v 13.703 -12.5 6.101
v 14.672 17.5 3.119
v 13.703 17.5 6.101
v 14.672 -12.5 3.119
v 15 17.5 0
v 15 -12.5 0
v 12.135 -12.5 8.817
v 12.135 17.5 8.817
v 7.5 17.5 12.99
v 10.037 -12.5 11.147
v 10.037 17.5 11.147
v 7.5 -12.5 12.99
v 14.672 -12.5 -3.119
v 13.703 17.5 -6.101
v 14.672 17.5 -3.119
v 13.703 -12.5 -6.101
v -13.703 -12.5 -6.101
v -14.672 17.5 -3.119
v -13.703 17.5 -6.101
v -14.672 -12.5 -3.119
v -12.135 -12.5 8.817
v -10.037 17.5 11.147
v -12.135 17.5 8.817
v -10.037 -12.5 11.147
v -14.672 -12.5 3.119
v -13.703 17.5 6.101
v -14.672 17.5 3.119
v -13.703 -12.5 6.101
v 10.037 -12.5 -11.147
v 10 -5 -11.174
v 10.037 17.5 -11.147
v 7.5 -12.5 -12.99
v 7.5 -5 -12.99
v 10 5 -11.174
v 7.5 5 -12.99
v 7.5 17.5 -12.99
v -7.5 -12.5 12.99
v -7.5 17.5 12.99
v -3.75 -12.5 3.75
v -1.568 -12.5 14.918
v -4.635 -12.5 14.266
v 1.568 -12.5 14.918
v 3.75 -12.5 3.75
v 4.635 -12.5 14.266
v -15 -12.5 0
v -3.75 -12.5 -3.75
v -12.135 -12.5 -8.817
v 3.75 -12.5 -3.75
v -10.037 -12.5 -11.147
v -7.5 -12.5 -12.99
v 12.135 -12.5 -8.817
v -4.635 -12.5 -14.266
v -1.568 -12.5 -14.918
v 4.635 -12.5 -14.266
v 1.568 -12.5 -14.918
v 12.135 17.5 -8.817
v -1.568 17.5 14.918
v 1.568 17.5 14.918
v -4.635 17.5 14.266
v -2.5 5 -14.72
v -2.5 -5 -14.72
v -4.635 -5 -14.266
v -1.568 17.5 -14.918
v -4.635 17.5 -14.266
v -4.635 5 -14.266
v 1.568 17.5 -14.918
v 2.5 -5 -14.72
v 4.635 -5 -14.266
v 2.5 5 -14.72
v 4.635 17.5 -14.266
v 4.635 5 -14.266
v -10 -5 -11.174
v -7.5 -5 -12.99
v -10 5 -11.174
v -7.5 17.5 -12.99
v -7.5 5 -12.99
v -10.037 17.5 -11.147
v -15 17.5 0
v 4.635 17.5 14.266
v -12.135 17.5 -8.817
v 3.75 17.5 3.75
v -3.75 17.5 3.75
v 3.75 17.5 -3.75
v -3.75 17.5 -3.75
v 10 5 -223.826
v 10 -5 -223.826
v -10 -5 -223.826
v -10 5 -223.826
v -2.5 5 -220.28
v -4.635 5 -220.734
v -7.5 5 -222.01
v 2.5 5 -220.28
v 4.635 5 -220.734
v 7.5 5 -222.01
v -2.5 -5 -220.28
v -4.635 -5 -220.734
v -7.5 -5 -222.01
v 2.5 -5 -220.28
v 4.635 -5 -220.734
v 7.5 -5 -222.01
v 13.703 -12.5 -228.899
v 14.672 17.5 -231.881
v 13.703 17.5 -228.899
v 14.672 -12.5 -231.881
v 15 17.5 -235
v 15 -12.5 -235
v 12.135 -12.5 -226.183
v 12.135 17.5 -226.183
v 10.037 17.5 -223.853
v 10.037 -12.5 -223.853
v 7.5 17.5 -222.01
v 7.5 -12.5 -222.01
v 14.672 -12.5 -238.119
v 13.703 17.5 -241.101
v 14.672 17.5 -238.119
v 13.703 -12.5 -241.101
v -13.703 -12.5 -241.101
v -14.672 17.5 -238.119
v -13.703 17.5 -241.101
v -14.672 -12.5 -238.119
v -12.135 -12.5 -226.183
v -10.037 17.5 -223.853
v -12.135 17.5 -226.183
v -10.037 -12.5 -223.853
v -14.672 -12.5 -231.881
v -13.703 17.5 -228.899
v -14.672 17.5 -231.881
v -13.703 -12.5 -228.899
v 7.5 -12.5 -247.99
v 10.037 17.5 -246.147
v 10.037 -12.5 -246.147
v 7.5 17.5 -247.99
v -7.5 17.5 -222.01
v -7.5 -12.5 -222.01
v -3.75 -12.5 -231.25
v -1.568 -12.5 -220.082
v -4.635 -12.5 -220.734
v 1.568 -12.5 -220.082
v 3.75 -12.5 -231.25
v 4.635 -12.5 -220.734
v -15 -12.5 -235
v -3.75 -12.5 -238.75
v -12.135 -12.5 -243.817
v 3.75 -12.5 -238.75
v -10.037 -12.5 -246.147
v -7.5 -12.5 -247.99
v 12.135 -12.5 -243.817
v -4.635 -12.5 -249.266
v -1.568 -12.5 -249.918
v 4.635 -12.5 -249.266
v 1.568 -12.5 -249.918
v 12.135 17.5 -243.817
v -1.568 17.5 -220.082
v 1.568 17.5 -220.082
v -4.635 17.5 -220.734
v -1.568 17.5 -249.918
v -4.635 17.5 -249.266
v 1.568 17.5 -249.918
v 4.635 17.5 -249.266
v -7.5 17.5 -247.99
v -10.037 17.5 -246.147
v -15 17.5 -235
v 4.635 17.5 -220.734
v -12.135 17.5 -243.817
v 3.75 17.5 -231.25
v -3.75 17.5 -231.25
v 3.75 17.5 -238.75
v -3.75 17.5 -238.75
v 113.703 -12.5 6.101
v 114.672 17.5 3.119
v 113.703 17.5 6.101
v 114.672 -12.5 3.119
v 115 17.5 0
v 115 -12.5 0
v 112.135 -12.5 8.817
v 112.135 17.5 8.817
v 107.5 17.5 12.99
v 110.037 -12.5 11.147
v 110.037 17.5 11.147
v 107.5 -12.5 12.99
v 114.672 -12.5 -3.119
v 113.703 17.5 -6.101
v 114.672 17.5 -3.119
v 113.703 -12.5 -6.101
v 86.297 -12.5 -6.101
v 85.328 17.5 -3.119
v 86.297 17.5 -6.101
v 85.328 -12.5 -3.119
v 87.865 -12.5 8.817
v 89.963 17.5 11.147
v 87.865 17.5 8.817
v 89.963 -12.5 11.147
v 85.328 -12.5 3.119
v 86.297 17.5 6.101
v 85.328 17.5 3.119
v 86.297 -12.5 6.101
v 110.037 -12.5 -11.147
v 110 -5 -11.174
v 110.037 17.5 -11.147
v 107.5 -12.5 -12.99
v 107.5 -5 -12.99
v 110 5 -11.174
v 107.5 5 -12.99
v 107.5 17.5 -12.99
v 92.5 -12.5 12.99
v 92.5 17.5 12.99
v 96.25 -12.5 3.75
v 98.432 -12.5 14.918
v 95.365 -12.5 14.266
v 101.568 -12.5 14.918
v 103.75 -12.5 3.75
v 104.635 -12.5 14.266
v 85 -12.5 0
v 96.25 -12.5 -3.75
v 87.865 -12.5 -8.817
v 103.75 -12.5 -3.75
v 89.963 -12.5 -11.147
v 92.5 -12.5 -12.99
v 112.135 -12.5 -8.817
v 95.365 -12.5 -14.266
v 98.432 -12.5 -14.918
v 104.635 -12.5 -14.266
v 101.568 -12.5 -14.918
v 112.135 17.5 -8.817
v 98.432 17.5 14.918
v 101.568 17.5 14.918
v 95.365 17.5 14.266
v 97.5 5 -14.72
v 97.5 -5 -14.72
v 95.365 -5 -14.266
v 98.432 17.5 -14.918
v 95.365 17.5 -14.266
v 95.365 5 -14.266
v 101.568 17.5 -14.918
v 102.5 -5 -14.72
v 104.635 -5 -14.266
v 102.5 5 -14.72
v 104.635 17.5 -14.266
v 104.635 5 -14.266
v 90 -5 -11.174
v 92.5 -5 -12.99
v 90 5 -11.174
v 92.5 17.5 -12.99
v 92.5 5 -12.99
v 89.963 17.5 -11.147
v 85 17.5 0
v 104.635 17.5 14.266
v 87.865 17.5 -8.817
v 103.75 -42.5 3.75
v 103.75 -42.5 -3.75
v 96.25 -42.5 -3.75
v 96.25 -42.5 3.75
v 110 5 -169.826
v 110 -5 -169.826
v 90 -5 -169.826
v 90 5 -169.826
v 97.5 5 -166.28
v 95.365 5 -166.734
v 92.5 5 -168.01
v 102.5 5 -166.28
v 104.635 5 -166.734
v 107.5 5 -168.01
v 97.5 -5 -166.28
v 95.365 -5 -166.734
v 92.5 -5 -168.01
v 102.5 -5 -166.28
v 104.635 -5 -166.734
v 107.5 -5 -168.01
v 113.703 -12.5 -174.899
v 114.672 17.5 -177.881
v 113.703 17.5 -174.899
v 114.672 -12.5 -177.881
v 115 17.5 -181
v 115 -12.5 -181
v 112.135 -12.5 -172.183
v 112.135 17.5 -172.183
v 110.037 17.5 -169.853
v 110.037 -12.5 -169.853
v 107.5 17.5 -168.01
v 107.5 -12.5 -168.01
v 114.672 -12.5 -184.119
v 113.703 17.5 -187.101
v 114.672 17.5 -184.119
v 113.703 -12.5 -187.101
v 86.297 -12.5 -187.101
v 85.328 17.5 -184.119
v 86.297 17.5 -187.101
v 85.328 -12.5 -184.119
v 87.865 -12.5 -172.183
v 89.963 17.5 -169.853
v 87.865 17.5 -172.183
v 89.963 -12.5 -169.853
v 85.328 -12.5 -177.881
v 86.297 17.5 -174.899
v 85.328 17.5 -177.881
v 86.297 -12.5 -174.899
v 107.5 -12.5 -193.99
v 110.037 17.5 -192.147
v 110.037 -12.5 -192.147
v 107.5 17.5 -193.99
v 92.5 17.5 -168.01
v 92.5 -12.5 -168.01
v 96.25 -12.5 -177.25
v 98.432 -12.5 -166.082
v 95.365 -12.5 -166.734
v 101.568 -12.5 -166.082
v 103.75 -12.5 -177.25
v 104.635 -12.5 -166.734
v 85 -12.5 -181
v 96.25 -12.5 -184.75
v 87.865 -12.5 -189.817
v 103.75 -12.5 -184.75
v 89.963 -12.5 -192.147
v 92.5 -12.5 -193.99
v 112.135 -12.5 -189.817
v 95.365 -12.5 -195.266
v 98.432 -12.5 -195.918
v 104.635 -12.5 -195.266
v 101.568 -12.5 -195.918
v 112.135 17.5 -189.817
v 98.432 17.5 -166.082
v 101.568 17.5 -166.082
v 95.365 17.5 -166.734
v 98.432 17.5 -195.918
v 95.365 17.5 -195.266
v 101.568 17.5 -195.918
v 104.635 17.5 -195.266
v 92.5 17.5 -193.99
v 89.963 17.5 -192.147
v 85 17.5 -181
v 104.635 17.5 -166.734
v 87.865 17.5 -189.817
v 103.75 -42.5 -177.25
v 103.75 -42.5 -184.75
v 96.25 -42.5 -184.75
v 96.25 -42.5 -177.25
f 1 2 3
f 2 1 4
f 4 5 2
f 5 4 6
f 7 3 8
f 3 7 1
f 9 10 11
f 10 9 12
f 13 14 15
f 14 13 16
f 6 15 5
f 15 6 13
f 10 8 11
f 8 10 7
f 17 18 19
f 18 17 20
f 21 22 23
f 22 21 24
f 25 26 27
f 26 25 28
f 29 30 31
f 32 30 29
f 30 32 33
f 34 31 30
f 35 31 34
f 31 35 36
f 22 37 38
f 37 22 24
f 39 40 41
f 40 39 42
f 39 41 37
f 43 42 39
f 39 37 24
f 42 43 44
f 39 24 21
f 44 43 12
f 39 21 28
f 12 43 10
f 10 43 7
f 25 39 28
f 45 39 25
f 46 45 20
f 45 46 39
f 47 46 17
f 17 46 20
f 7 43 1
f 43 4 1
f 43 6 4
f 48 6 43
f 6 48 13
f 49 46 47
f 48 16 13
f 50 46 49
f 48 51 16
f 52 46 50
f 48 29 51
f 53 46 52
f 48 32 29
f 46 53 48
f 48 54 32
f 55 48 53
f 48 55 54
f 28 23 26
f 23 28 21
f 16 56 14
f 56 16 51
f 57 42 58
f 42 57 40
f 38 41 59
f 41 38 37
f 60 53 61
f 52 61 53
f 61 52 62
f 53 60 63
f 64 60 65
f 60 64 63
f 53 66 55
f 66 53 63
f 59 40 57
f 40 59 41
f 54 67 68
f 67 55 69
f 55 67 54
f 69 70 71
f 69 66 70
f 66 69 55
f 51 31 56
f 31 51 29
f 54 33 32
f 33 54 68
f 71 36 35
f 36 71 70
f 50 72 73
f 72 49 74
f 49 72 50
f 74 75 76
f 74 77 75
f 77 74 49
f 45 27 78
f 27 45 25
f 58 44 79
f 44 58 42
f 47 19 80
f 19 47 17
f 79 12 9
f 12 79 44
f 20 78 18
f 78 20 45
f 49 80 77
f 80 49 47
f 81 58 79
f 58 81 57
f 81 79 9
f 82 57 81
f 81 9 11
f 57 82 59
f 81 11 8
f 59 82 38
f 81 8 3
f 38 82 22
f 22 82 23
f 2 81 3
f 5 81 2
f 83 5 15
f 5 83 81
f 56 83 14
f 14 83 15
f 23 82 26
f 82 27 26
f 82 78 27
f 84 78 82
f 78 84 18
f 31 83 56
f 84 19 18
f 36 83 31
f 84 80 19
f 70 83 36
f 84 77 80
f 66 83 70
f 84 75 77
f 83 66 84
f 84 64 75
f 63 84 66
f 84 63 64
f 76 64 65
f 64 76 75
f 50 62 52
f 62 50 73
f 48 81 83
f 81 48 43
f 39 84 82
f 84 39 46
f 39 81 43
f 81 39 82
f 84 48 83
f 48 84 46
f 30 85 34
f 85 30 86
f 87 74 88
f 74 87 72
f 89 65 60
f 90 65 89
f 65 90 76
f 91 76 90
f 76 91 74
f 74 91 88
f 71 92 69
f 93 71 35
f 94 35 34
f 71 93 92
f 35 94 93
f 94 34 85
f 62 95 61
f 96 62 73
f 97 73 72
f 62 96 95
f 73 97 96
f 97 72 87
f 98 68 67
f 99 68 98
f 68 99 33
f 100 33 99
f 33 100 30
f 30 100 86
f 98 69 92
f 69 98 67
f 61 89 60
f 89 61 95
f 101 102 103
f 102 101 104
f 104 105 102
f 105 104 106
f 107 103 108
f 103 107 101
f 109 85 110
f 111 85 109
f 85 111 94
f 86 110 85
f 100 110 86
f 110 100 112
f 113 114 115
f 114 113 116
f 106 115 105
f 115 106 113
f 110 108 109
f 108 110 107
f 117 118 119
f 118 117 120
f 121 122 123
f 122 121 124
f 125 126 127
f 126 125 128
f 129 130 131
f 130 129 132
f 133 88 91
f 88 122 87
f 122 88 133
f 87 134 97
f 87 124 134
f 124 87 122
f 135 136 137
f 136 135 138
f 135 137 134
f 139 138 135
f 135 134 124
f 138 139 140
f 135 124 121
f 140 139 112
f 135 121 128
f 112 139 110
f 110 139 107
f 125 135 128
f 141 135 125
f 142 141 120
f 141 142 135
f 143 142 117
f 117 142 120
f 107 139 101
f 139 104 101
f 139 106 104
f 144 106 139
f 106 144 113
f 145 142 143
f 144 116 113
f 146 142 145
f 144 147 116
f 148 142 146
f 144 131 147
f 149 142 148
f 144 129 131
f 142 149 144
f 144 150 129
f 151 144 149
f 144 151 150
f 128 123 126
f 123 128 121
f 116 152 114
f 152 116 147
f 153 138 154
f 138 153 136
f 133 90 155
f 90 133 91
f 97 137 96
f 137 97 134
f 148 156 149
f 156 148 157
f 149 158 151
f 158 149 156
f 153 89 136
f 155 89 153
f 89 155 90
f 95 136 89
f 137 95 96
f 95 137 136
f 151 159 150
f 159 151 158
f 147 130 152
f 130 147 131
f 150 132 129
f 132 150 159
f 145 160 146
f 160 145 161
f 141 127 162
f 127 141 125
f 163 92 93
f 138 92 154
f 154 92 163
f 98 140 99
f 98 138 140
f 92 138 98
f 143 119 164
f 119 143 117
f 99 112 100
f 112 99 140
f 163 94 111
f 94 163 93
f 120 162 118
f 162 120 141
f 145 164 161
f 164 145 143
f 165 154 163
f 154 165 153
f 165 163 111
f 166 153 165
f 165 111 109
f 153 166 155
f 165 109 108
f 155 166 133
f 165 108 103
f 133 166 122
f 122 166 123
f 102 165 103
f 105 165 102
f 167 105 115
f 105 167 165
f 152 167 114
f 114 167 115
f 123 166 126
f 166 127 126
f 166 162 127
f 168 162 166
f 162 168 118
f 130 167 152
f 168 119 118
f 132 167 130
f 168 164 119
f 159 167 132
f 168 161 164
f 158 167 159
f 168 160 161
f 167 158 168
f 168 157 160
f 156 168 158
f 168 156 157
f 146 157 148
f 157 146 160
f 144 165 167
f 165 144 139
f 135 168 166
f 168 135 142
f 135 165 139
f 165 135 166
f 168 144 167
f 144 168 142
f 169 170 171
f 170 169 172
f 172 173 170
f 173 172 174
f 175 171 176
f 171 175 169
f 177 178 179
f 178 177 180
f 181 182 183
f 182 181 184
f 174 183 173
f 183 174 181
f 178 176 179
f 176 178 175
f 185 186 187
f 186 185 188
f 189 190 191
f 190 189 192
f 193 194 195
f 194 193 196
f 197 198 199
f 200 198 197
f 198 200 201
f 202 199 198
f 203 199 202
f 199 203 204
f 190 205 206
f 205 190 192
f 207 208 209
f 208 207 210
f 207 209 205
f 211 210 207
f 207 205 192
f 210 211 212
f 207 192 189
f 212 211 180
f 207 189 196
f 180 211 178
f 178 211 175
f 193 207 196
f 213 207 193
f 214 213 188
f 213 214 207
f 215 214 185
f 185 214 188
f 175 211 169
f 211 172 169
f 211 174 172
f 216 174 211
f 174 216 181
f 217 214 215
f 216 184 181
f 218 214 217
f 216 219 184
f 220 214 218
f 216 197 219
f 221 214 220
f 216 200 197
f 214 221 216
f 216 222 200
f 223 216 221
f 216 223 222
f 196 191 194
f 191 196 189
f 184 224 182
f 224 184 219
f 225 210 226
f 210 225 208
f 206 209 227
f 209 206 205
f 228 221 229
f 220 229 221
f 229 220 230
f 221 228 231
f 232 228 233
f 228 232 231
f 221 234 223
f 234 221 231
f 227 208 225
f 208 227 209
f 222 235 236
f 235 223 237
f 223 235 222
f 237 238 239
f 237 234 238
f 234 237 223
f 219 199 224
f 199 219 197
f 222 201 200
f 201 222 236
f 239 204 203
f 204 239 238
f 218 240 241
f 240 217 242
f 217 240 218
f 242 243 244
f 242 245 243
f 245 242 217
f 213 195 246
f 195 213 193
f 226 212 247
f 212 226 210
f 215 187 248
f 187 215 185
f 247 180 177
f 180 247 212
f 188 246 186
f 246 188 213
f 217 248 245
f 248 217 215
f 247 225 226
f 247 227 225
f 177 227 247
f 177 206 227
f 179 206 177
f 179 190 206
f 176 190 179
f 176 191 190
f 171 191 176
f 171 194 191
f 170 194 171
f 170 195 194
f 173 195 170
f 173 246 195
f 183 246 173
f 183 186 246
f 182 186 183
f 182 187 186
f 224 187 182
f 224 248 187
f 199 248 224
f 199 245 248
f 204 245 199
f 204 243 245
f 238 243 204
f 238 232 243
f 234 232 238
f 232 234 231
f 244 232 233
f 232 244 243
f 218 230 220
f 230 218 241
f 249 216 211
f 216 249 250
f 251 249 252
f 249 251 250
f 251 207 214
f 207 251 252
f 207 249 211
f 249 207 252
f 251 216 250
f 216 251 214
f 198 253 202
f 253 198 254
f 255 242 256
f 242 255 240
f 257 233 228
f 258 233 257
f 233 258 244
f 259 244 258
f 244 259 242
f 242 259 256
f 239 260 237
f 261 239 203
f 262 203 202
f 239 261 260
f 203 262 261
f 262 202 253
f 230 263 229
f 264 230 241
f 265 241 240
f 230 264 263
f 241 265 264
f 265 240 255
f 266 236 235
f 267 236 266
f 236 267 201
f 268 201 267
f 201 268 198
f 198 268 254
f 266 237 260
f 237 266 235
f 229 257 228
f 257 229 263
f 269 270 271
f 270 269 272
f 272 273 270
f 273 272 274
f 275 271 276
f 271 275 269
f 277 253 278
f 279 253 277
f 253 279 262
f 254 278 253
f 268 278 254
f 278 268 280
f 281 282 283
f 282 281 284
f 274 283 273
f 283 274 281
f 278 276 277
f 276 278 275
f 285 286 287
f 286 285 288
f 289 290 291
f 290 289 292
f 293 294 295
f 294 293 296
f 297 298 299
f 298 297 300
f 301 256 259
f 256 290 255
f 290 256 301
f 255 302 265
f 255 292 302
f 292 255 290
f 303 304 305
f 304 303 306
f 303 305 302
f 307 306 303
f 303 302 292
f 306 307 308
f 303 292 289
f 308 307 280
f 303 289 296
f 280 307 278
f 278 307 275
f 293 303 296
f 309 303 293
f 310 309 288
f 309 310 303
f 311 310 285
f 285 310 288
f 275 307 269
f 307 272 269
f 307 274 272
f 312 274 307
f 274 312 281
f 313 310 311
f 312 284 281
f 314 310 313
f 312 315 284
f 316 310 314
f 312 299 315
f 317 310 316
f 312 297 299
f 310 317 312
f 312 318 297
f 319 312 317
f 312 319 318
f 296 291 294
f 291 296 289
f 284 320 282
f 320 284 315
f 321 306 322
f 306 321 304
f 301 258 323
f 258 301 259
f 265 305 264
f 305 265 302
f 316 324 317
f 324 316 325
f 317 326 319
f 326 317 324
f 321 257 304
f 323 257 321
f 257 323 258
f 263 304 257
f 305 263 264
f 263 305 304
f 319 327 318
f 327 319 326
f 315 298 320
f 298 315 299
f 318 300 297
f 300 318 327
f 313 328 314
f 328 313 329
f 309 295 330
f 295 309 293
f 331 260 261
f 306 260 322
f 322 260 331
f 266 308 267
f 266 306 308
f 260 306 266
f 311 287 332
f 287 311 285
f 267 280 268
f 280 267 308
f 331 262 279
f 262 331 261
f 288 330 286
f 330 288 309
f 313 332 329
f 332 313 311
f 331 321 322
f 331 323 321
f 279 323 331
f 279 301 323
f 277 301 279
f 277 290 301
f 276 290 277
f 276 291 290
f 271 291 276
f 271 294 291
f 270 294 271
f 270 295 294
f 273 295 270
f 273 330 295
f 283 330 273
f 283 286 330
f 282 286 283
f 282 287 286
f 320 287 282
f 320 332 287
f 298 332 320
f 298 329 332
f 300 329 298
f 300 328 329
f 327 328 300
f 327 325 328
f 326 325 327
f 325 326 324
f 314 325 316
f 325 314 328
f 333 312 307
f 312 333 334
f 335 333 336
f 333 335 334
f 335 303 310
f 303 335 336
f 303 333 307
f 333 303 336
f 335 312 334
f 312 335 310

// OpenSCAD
unit = 10;

// loop vars
outer_loop_rad = unit * 1.5;
inner_loop_rad = outer_loop_rad / 2;
protruding_loop_rad = inner_loop_rad - 2;
loop_height = unit * 3;
frame_offset = loop_height / 12;

module circular_hole()
{
	cylinder(h = loop_height, r = inner_loop_rad, center = true); 
}

module square_hole()
{
	cube(size = [inner_loop_rad, inner_loop_rad, loop_height], center = true);
}

module loop()
{
	translate([0, frame_offset, 0]) rotate([90,0,0]) {
		difference() {
			cylinder(h = loop_height, r = outer_loop_rad, 
				center = true);
			square_hole(); //circular_hole();
		}
	}
}

// frame vars
frame_length_long = unit * 22; // 11 inches
frame_length_short = unit * 17; // 8.5 inches
frame_width = unit * 2;
frame_height = frame_width / 2;
rail_width = frame_width / 4;

// long part, the rails
module frame(frame_len)
{
	translate([0, 0, (-1) * (frame_len / 2 + inner_loop_rad)])
		difference() {
			cube([frame_width, frame_height, frame_len], center = true);
			cube([rail_width, frame_height, frame_len], center = true);
		}
}

module frame_long_side() {
	union() {
		loop();
		frame(frame_length_long);
		translate([0, 0, -1 * (frame_length_long + inner_loop_rad * 2)])
			loop();
	}
}

frame_long_side();

module circular_protrusion()
{
	translate([0, 0, loop_height])
		cylinder(h = loop_height, r = protruding_loop_rad, 
			center = true);
}

module square_protrusion()
{
	translate([0, 0, loop_height])
		square_hole();
}


module loop_protruding()
{
		translate([0, frame_offset, 0]) rotate([90,0,0]) {
			union() {
				cylinder(h = loop_height, r = outer_loop_rad, 
					center = true);
				square_protrusion(); // circular_protrusion();
		}
	}
}

module frame_short_side()
{
	translate([100, 0, 0]) {
		union() {
			loop_protruding();
			frame(frame_length_short);
			translate([0, 0, -1 * (frame_length_short + protruding_loop_rad * 2)])
				loop_protruding();
			
		}
	}
}

frame_short_side();
